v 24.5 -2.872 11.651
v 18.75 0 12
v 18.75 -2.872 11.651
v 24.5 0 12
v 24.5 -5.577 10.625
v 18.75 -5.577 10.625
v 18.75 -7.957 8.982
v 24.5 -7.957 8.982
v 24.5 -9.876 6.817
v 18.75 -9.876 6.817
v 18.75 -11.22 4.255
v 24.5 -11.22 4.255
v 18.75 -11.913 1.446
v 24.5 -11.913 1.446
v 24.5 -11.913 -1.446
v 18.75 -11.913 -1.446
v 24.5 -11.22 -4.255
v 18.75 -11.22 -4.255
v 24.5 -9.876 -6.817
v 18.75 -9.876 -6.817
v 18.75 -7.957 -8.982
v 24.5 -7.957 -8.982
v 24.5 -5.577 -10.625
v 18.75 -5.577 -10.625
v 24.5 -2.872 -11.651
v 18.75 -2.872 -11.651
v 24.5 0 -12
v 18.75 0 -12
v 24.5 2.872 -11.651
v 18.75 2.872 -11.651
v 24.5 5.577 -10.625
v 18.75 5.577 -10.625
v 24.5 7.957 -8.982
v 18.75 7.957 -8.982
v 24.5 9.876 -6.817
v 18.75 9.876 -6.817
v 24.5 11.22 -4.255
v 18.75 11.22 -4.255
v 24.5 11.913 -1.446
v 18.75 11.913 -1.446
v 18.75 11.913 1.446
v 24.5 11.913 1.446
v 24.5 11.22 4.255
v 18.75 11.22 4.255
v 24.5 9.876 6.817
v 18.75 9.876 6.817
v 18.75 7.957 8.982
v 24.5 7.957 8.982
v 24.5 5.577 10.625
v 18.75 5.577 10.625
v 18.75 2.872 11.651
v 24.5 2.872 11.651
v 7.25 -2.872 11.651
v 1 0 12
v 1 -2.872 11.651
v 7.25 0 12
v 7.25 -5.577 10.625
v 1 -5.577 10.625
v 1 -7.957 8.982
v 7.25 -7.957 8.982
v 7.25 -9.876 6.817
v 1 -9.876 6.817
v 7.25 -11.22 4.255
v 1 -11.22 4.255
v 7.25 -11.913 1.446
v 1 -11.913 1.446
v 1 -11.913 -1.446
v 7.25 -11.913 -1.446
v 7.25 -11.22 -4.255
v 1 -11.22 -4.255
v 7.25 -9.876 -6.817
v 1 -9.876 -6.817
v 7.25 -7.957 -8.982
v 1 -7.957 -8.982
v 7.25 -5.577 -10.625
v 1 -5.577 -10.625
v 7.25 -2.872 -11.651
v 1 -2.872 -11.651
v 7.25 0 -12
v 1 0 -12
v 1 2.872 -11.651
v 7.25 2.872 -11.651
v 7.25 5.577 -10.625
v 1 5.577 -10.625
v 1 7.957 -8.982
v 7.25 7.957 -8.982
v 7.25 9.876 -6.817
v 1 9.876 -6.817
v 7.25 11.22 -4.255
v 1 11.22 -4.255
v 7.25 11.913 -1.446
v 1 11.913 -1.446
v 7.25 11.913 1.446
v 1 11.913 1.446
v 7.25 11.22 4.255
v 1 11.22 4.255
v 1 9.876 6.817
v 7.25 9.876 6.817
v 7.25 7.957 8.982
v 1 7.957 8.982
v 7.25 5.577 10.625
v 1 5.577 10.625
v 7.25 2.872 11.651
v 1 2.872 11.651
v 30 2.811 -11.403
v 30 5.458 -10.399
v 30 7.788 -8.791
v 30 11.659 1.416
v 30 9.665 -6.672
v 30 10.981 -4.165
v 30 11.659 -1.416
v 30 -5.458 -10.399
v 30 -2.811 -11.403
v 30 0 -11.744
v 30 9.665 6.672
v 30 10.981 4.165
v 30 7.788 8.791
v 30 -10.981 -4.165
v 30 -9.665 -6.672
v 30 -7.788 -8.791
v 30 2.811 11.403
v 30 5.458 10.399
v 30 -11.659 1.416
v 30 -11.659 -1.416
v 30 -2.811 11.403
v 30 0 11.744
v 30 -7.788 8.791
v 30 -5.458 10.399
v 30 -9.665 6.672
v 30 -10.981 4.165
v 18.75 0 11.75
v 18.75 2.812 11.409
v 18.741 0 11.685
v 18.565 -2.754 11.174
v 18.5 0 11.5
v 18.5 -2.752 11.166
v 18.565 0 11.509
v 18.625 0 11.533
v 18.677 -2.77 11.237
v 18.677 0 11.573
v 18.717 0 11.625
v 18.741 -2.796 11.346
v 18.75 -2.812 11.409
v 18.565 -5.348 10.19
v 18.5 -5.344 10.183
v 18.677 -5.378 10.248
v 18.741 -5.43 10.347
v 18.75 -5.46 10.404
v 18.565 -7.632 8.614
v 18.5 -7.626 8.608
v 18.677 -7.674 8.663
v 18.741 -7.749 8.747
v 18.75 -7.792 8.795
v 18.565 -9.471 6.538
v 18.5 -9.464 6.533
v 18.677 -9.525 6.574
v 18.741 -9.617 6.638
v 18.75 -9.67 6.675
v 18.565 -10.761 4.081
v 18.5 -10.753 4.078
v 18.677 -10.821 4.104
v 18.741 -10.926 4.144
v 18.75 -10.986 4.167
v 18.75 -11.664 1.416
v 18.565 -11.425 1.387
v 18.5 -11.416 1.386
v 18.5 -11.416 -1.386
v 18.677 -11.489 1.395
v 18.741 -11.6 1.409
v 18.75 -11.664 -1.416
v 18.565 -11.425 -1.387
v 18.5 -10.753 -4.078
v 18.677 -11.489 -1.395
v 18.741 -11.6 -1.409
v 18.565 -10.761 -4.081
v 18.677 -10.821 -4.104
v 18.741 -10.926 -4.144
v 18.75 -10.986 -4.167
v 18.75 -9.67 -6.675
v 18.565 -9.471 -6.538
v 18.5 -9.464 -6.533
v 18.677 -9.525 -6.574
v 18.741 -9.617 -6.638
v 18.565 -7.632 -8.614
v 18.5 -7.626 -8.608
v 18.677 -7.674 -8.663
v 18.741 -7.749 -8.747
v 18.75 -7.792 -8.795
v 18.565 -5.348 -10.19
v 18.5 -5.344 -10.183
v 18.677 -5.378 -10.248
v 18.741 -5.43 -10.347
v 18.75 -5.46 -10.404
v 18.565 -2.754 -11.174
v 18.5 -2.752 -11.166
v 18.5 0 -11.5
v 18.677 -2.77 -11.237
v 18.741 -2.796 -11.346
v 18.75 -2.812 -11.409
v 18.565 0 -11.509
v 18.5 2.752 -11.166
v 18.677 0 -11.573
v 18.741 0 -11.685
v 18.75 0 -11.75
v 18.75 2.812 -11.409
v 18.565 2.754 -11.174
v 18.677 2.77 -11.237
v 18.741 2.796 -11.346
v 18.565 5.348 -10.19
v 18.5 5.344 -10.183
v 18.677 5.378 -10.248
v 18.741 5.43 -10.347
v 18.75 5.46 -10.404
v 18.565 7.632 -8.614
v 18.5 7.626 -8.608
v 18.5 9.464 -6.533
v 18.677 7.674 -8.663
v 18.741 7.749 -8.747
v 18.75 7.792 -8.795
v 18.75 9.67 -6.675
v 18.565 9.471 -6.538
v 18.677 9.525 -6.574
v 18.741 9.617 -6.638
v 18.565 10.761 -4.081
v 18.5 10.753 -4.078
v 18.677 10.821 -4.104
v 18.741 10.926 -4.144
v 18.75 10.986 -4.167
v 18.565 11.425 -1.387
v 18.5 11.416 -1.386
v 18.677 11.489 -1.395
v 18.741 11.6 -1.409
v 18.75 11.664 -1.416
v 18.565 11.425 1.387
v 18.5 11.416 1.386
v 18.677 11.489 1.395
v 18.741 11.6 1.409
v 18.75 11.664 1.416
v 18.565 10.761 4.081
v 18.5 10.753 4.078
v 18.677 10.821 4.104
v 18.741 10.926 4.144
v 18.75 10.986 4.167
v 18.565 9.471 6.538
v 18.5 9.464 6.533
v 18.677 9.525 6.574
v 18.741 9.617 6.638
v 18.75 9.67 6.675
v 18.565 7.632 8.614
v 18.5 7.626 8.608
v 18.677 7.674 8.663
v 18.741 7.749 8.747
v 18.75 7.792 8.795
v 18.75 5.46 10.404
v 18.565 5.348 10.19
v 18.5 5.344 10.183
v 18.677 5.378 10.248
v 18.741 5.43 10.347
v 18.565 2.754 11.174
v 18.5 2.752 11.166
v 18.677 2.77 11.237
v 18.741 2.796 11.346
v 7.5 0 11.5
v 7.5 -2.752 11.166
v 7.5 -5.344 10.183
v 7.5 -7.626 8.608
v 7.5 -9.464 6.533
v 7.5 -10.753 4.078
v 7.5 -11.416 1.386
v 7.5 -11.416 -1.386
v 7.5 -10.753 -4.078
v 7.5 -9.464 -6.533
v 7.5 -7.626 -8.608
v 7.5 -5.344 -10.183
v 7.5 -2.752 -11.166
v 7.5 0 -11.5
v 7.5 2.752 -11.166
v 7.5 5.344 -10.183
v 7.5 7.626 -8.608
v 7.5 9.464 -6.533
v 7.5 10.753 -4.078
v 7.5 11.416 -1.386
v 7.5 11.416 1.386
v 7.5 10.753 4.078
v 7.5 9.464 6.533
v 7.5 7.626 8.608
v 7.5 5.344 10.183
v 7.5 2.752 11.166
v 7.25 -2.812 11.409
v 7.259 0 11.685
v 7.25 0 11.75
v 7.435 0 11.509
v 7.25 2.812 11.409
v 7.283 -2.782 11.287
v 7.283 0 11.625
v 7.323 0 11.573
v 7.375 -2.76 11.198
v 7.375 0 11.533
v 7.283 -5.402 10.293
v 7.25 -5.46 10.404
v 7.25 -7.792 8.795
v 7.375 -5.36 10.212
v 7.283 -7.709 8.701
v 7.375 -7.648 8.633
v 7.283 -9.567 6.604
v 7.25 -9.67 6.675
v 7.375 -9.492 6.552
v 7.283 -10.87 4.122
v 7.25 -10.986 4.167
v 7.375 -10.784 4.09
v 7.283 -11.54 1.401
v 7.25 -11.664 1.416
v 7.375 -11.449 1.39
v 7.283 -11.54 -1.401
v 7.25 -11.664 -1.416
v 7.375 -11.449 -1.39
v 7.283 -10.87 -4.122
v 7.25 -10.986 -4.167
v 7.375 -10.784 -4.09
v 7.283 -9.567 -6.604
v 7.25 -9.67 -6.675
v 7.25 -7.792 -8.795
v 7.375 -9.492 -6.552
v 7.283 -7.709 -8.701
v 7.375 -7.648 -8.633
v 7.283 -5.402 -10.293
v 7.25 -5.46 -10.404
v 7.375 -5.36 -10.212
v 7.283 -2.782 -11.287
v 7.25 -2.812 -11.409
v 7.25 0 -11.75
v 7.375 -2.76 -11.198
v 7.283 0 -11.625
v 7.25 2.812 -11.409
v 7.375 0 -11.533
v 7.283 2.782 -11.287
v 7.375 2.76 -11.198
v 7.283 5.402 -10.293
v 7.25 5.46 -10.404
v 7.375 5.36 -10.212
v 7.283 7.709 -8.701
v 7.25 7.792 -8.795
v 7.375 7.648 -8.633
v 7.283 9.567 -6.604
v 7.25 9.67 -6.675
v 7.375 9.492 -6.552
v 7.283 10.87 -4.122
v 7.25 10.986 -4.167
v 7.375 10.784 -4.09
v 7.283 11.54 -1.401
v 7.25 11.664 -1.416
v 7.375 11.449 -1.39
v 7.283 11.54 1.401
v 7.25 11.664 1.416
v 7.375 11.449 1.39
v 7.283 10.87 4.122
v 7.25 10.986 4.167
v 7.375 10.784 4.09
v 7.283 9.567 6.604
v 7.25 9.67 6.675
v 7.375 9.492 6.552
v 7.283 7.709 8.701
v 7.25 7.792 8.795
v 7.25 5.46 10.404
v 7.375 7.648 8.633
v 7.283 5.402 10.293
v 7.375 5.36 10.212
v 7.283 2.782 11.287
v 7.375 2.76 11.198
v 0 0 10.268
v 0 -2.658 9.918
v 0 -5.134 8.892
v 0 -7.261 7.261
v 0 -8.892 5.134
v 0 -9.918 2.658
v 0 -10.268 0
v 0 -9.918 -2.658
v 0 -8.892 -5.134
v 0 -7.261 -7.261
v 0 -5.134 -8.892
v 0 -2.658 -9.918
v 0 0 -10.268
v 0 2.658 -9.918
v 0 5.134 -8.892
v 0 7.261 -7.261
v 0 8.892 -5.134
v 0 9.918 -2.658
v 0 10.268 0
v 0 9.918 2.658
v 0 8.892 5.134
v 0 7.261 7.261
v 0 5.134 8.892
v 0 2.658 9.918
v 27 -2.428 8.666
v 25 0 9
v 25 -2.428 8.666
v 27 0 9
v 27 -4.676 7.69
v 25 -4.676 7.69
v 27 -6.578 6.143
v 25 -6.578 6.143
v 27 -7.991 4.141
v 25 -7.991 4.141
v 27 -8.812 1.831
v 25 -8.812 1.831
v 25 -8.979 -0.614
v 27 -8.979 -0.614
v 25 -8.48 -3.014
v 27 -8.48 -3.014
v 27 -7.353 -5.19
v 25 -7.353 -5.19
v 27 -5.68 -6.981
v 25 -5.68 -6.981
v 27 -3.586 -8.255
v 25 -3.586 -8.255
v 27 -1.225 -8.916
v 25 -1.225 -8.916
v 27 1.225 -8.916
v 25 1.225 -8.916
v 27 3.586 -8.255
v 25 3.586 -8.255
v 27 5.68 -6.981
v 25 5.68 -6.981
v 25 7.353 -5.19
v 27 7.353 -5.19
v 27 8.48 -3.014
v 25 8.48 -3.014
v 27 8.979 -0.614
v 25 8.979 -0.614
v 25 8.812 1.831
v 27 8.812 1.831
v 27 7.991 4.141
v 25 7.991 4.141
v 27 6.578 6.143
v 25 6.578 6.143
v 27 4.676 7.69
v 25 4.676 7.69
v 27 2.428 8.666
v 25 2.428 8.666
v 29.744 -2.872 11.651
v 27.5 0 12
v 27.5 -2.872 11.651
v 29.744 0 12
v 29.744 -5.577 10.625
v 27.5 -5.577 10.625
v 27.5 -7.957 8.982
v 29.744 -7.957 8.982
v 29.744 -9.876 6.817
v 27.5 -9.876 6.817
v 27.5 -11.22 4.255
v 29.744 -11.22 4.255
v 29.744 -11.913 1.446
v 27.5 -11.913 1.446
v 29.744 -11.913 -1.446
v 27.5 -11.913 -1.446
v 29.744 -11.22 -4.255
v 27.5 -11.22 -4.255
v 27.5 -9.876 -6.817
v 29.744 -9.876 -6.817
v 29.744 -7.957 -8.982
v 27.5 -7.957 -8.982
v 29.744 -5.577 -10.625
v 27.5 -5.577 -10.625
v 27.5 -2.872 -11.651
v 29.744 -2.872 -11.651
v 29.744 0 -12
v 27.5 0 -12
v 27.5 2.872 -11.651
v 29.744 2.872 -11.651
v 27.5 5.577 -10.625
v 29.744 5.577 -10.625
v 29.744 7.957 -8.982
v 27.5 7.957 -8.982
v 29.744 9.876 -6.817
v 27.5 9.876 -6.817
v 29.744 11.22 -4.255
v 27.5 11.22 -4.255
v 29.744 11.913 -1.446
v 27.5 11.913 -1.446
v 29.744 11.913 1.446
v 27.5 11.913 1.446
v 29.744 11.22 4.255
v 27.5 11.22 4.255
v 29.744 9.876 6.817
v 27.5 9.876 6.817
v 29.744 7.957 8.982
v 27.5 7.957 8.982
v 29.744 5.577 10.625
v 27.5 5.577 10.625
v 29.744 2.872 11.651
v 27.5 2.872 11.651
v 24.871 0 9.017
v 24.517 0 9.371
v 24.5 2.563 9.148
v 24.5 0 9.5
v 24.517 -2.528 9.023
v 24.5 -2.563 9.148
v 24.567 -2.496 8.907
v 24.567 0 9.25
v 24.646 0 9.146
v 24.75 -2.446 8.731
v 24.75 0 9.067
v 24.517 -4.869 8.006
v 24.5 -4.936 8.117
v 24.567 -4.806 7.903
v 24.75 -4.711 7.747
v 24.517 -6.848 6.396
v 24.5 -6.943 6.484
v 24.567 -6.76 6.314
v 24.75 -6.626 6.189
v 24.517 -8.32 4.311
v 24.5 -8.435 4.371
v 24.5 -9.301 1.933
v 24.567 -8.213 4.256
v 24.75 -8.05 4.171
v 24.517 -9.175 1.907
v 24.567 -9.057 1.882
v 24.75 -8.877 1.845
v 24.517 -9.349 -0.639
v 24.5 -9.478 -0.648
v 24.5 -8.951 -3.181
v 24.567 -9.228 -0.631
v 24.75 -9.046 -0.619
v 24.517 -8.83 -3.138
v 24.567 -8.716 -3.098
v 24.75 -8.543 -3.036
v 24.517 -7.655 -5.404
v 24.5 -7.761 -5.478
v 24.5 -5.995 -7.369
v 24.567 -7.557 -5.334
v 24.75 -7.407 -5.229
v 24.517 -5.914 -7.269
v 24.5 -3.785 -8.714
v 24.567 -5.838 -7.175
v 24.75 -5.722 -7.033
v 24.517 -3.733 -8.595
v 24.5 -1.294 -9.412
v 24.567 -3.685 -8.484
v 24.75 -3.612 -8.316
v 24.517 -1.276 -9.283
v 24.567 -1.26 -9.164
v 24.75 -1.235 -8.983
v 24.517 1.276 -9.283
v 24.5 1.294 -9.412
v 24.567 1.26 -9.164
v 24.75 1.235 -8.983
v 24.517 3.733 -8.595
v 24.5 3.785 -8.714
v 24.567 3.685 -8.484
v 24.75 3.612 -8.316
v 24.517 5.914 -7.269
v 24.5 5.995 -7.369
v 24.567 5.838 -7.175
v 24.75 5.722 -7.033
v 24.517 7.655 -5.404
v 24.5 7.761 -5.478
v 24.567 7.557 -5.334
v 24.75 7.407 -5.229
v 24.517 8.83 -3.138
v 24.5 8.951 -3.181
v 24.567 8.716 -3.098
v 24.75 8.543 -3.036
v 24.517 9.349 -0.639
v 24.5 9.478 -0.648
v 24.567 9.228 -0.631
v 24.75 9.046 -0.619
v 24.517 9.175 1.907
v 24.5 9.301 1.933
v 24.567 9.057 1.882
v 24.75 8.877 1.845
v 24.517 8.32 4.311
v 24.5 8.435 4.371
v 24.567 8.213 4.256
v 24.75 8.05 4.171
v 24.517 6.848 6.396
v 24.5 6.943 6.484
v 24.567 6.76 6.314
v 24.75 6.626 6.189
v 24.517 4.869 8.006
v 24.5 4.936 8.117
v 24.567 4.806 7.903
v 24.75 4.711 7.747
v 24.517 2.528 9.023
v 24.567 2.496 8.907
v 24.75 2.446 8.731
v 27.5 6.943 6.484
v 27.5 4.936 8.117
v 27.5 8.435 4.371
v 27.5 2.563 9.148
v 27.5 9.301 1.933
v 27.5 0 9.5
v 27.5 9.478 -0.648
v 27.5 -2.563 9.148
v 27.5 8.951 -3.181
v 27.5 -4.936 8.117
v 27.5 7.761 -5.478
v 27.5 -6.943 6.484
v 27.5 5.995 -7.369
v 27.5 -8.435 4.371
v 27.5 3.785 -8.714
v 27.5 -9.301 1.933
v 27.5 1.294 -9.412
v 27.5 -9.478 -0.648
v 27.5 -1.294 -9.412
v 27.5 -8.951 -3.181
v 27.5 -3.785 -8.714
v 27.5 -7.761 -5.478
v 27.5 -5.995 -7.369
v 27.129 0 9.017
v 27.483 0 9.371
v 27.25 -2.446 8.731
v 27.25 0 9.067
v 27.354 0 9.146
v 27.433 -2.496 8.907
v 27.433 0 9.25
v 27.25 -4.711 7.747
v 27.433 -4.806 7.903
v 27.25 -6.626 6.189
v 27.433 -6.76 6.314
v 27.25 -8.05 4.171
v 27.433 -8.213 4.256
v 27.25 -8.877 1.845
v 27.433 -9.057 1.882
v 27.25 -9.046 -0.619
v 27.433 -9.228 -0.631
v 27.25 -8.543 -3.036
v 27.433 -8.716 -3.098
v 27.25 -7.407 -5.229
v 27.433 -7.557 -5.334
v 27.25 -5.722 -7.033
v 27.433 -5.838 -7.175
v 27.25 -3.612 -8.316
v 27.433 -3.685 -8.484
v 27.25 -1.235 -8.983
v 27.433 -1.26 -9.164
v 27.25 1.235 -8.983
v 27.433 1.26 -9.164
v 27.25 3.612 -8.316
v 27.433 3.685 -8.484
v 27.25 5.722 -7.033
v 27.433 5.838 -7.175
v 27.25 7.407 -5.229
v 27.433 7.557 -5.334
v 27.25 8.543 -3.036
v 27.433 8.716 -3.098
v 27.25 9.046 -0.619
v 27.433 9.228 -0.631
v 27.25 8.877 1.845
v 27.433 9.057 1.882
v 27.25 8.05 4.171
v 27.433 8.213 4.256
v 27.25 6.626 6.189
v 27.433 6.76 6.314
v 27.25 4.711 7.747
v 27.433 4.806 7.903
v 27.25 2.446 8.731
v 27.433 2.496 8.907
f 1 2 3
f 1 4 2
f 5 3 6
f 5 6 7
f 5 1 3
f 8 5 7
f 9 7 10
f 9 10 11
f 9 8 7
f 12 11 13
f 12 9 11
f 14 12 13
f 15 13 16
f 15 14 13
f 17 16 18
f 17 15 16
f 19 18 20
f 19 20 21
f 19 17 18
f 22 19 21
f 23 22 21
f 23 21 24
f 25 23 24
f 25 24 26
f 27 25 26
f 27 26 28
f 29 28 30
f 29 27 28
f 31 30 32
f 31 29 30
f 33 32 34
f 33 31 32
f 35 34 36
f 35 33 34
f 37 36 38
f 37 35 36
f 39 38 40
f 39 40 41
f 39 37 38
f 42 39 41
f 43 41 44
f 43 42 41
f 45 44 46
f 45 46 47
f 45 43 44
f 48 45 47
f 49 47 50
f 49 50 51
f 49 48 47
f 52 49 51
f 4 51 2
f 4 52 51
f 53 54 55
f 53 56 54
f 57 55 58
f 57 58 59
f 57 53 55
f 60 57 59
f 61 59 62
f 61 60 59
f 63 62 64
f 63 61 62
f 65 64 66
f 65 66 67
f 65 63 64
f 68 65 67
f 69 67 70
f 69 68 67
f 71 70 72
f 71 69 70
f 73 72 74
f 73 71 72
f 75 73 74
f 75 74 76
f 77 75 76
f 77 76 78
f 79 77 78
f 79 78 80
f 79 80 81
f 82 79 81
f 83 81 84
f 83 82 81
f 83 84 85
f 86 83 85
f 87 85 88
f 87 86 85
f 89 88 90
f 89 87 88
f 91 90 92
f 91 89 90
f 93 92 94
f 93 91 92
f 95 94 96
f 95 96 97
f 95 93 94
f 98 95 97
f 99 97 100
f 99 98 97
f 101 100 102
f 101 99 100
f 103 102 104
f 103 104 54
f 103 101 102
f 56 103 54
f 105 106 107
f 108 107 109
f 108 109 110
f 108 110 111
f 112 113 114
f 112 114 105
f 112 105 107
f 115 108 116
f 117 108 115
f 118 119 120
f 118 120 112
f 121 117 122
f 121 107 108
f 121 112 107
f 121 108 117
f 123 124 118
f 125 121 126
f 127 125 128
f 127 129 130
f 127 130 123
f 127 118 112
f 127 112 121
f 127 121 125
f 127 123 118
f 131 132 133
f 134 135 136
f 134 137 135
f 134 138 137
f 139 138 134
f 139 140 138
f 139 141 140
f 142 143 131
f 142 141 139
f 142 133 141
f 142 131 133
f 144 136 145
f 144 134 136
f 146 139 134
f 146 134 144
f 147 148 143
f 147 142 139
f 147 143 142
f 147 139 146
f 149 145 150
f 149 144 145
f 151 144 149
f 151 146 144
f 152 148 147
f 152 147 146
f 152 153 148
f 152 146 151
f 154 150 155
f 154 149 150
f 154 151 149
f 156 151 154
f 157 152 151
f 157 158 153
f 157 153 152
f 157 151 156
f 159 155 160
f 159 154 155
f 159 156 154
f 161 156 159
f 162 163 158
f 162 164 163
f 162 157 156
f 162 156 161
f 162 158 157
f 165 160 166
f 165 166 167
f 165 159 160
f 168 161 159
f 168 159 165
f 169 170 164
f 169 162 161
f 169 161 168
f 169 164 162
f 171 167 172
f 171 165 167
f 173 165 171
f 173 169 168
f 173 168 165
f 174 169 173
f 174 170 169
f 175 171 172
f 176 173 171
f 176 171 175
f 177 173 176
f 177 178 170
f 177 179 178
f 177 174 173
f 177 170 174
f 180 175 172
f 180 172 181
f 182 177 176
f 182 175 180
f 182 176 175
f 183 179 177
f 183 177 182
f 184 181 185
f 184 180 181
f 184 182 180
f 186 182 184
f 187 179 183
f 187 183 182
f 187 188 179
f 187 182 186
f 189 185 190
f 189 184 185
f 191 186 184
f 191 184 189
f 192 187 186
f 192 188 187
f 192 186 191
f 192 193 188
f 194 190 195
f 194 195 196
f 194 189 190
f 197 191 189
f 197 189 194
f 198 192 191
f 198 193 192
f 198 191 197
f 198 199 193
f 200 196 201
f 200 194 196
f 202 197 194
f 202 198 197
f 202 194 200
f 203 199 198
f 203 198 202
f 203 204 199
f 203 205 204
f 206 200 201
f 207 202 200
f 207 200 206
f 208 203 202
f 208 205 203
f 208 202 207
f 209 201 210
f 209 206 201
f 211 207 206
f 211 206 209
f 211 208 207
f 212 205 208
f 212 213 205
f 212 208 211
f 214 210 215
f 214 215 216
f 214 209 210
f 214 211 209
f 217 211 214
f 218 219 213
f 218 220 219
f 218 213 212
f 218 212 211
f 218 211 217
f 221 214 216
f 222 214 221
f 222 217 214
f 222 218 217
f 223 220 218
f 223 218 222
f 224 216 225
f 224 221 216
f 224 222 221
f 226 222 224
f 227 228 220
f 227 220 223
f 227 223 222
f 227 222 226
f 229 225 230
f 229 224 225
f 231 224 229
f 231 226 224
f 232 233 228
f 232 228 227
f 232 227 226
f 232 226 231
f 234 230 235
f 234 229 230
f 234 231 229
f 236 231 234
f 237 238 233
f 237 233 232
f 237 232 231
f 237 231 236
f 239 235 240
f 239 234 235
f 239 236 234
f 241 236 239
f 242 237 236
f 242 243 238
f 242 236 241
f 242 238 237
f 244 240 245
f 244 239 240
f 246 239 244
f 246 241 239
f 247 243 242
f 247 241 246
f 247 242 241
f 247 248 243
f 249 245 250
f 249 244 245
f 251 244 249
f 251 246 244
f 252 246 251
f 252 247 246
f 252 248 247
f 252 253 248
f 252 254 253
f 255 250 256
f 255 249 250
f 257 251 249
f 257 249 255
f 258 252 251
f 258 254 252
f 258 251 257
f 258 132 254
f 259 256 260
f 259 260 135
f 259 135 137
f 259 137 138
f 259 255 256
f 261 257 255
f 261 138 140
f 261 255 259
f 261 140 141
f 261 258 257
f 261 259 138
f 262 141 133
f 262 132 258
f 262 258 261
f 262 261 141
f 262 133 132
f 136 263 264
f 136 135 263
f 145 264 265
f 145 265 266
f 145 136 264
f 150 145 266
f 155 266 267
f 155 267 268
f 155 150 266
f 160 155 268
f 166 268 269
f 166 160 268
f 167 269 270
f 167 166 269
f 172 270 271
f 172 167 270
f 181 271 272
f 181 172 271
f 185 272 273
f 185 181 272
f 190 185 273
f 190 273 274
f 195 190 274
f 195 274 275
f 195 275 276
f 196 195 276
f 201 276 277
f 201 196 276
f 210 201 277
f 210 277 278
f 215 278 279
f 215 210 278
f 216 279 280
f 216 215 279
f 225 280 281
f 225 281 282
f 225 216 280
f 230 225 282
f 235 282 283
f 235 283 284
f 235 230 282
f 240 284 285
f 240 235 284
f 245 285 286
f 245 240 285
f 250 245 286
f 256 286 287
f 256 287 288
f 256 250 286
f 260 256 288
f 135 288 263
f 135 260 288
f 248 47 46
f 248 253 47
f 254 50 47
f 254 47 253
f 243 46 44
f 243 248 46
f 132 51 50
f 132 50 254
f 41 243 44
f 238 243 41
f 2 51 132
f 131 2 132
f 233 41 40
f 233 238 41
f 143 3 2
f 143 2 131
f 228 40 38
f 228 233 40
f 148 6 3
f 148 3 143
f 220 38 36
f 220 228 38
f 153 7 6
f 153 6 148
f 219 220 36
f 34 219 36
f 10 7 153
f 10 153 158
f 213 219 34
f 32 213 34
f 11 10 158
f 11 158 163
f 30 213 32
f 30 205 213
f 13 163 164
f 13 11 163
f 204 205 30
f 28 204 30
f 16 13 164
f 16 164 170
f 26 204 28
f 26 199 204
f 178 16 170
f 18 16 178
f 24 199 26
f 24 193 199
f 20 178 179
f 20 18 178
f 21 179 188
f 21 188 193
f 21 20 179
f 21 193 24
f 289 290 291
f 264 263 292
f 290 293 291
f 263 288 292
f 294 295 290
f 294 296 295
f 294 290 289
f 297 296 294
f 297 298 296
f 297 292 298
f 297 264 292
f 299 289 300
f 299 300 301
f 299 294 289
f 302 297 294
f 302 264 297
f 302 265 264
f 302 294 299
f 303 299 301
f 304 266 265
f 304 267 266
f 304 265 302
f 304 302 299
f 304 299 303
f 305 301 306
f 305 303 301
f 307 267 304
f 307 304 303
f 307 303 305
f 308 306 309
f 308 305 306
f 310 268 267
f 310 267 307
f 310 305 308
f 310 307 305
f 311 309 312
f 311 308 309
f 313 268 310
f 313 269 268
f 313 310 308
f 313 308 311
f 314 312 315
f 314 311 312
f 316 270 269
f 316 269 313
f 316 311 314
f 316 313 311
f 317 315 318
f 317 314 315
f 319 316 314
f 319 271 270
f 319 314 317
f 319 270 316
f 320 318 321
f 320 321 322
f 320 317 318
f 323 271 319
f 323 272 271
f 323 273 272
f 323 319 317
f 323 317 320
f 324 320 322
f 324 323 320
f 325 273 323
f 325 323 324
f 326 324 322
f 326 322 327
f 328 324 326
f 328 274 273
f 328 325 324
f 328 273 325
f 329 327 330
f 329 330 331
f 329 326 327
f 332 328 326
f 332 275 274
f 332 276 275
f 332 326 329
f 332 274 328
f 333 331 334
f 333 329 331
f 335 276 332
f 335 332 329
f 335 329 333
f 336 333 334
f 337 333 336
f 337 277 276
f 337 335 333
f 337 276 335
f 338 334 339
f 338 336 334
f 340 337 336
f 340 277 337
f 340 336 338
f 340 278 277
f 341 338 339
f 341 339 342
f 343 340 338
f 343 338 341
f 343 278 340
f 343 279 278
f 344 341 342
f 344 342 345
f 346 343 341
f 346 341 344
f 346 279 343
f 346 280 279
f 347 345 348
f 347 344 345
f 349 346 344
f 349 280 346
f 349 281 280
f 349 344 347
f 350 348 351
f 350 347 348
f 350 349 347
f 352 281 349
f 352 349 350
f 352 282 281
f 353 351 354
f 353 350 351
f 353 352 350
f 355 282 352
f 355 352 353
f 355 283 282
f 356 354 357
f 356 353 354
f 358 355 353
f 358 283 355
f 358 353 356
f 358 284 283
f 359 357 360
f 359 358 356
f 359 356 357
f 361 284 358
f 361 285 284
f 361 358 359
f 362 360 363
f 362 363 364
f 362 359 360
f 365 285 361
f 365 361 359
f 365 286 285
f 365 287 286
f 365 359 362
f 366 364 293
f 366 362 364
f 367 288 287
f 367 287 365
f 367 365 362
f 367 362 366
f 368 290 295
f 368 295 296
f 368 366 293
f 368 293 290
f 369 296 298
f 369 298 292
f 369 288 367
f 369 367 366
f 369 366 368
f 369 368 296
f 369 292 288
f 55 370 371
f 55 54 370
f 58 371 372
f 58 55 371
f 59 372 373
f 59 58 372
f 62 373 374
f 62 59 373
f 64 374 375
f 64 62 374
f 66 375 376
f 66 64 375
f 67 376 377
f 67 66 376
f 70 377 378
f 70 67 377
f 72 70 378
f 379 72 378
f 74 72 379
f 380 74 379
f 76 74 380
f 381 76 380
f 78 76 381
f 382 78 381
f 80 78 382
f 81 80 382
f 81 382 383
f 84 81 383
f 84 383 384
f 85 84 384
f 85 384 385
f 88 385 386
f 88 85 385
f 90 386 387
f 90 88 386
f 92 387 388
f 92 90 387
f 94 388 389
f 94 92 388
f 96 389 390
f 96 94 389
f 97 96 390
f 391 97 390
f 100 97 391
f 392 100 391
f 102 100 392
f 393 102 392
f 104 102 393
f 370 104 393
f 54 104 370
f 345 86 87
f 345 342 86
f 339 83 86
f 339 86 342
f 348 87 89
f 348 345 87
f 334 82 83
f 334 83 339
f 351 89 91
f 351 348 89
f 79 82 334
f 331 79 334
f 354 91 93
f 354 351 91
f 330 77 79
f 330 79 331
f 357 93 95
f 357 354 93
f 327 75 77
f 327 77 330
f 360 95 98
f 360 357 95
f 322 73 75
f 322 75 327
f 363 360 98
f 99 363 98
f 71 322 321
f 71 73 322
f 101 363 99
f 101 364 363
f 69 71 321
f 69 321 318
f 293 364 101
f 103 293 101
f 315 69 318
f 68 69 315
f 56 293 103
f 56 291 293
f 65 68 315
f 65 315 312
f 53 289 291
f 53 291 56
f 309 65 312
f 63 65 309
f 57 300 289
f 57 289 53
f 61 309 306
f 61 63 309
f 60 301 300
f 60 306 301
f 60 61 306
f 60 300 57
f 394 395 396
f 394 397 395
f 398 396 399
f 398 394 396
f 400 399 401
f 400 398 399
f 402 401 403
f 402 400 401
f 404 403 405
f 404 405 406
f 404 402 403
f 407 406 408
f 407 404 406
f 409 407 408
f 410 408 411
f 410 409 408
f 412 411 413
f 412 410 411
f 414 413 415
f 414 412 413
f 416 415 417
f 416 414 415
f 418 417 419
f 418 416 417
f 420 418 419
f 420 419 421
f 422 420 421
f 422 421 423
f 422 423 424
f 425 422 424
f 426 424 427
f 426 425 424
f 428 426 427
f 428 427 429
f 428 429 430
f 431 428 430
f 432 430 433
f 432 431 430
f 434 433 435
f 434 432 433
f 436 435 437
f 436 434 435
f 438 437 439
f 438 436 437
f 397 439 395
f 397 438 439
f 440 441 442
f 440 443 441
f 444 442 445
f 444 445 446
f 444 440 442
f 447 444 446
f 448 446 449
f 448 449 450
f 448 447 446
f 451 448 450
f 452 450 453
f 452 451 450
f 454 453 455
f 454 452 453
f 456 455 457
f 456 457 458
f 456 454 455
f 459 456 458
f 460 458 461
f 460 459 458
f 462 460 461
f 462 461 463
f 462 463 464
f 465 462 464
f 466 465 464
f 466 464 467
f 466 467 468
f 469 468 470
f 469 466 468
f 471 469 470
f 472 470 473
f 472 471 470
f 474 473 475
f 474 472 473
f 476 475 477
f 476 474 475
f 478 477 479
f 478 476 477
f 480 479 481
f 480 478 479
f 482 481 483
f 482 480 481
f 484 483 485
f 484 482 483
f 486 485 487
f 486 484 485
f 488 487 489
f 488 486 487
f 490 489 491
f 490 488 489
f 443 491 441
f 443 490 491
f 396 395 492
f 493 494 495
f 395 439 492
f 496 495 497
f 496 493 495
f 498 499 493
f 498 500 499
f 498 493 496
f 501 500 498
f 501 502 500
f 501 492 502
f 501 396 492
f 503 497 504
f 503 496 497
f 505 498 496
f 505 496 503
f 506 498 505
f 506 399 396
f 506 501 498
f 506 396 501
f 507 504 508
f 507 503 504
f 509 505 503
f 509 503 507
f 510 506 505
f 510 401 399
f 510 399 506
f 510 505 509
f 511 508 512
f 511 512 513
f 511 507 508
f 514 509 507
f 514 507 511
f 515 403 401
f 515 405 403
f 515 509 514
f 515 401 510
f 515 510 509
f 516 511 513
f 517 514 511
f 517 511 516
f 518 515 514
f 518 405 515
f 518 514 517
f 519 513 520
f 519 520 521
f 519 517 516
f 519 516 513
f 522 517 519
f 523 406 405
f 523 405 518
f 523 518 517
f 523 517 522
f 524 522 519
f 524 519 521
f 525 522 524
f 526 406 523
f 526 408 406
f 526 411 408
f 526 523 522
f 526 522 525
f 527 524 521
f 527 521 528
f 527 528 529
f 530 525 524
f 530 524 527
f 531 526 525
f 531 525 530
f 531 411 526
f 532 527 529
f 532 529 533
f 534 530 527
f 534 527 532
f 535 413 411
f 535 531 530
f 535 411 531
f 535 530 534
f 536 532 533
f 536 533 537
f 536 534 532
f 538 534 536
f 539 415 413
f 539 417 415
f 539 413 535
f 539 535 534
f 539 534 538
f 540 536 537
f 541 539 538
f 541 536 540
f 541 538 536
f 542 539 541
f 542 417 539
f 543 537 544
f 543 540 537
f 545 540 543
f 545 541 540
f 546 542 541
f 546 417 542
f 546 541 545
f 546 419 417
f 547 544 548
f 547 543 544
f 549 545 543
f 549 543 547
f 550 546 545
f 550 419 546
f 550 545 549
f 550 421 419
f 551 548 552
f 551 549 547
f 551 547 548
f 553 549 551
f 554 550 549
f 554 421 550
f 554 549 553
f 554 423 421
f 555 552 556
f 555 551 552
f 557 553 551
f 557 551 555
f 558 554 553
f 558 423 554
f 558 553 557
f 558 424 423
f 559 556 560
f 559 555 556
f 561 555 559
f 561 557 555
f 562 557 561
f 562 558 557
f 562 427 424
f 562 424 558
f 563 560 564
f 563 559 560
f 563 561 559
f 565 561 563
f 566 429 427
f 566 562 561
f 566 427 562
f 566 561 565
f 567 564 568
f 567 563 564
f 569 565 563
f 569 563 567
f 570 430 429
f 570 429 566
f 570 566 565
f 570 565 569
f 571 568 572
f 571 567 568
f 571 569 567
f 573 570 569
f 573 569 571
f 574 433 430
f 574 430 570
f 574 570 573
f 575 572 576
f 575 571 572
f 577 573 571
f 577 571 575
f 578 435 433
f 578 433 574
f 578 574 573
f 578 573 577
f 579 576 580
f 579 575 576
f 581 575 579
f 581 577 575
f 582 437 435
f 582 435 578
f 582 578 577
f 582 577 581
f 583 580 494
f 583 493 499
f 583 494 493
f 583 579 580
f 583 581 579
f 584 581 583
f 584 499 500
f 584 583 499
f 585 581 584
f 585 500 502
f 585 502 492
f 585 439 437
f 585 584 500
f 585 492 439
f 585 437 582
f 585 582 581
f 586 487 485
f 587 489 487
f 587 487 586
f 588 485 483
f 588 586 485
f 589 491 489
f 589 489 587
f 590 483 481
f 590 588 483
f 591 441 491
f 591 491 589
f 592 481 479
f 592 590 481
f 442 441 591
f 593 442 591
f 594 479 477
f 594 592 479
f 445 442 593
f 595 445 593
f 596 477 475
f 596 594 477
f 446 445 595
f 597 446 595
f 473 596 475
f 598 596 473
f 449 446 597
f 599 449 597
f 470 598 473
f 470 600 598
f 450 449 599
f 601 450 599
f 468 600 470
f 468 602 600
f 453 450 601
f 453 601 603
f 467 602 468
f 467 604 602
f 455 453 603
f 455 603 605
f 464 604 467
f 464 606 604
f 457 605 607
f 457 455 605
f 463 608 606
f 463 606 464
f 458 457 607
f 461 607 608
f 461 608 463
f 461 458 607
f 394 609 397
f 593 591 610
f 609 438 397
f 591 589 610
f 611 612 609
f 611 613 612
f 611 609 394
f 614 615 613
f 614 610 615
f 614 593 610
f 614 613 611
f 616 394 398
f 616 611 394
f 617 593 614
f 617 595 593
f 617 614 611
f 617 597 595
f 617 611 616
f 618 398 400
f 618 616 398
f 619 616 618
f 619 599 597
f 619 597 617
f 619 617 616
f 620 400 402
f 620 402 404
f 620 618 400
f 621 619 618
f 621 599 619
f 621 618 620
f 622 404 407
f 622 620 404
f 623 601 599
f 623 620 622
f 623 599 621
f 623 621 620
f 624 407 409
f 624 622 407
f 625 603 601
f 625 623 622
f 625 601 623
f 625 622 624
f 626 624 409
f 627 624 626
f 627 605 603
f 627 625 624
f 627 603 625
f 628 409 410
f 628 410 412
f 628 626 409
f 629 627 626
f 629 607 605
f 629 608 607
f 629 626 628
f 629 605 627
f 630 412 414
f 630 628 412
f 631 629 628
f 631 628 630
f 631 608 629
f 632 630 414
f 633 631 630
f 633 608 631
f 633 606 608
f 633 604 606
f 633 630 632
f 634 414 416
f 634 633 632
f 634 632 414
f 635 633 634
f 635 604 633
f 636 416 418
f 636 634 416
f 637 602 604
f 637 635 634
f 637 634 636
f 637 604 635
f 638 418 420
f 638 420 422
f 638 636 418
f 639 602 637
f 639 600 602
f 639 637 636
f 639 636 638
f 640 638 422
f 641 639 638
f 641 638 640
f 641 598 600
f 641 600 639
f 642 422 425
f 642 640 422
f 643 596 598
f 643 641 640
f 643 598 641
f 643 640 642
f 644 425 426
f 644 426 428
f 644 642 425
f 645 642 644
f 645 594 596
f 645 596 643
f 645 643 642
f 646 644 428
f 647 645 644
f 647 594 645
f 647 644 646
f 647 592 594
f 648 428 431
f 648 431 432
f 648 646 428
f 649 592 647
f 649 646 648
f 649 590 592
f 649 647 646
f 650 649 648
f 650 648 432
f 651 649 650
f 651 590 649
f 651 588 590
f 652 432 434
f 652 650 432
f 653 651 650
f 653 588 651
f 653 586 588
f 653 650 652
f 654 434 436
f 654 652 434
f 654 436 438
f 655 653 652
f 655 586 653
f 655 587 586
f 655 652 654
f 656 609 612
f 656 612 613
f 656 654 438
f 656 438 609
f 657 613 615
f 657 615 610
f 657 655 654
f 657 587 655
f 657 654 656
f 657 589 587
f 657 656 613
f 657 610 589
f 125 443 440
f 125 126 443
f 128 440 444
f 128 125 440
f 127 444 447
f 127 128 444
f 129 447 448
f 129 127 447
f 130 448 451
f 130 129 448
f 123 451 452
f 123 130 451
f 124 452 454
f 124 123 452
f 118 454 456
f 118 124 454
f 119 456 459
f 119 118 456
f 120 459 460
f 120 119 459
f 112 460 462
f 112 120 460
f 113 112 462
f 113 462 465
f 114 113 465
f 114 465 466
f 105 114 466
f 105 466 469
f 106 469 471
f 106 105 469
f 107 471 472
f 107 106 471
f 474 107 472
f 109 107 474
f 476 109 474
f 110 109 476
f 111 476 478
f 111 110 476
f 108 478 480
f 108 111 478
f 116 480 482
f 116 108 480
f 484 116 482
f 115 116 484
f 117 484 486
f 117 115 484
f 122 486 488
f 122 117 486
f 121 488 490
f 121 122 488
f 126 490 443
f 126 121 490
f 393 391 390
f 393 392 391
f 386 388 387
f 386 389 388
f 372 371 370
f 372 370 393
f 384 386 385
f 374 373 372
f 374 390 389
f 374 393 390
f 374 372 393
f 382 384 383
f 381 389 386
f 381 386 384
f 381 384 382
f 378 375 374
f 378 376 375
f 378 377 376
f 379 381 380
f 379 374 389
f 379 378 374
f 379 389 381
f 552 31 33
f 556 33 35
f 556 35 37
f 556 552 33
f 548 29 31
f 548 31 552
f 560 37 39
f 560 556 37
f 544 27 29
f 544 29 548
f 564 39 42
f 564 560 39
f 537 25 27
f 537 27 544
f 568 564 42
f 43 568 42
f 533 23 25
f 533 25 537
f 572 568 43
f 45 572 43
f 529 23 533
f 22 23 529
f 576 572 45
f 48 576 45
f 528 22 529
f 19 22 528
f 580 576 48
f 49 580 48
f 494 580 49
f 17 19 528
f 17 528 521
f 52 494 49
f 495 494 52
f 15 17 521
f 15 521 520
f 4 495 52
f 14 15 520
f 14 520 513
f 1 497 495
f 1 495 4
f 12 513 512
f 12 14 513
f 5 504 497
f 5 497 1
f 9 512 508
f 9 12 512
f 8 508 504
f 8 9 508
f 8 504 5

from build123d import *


with BuildPart() as part:
    # Esquisse1 → Révolution1 (revolve)
    with BuildSketch(Plane.XY):
        with BuildLine():
            Line((0, 0), (0, 10.267949192))
            Line((0, 10.267949192), (1, 12))
            Line((1, 12), (7.25, 12))
            Line((7.25, 12), (7.25, 11.75))
            ThreePointArc((7.25, 11.75), (7.323223305, 11.573223305), (7.5, 11.5))
            Line((7.5, 11.5), (18.5, 11.5))
            ThreePointArc((18.5, 11.5), (18.676776695, 11.573223305), (18.75, 11.75))
            Line((18.75, 11.75), (18.75, 12))
            Line((18.75, 12), (24.5, 12))
            Line((24.5, 12), (24.5, 9.5))
            ThreePointArc((24.5, 9.5), (24.646446609, 9.146446609), (25, 9))
            Line((25, 9), (27, 9))
            ThreePointArc((27, 9), (27.353553391, 9.146446609), (27.5, 9.5))
            Line((27.5, 9.5), (27.5, 12))
            Line((27.5, 12), (29.744406675, 12))
            Line((29.744406675, 12), (30, 11.744406675))
            Line((30, 11.744406675), (30, 0))
            Line((30, 0), (0, 0))
        make_face()
    revolve(axis=Axis((-20.325204918, 0, 0), (1, 0, 0)))


solid = part.part
